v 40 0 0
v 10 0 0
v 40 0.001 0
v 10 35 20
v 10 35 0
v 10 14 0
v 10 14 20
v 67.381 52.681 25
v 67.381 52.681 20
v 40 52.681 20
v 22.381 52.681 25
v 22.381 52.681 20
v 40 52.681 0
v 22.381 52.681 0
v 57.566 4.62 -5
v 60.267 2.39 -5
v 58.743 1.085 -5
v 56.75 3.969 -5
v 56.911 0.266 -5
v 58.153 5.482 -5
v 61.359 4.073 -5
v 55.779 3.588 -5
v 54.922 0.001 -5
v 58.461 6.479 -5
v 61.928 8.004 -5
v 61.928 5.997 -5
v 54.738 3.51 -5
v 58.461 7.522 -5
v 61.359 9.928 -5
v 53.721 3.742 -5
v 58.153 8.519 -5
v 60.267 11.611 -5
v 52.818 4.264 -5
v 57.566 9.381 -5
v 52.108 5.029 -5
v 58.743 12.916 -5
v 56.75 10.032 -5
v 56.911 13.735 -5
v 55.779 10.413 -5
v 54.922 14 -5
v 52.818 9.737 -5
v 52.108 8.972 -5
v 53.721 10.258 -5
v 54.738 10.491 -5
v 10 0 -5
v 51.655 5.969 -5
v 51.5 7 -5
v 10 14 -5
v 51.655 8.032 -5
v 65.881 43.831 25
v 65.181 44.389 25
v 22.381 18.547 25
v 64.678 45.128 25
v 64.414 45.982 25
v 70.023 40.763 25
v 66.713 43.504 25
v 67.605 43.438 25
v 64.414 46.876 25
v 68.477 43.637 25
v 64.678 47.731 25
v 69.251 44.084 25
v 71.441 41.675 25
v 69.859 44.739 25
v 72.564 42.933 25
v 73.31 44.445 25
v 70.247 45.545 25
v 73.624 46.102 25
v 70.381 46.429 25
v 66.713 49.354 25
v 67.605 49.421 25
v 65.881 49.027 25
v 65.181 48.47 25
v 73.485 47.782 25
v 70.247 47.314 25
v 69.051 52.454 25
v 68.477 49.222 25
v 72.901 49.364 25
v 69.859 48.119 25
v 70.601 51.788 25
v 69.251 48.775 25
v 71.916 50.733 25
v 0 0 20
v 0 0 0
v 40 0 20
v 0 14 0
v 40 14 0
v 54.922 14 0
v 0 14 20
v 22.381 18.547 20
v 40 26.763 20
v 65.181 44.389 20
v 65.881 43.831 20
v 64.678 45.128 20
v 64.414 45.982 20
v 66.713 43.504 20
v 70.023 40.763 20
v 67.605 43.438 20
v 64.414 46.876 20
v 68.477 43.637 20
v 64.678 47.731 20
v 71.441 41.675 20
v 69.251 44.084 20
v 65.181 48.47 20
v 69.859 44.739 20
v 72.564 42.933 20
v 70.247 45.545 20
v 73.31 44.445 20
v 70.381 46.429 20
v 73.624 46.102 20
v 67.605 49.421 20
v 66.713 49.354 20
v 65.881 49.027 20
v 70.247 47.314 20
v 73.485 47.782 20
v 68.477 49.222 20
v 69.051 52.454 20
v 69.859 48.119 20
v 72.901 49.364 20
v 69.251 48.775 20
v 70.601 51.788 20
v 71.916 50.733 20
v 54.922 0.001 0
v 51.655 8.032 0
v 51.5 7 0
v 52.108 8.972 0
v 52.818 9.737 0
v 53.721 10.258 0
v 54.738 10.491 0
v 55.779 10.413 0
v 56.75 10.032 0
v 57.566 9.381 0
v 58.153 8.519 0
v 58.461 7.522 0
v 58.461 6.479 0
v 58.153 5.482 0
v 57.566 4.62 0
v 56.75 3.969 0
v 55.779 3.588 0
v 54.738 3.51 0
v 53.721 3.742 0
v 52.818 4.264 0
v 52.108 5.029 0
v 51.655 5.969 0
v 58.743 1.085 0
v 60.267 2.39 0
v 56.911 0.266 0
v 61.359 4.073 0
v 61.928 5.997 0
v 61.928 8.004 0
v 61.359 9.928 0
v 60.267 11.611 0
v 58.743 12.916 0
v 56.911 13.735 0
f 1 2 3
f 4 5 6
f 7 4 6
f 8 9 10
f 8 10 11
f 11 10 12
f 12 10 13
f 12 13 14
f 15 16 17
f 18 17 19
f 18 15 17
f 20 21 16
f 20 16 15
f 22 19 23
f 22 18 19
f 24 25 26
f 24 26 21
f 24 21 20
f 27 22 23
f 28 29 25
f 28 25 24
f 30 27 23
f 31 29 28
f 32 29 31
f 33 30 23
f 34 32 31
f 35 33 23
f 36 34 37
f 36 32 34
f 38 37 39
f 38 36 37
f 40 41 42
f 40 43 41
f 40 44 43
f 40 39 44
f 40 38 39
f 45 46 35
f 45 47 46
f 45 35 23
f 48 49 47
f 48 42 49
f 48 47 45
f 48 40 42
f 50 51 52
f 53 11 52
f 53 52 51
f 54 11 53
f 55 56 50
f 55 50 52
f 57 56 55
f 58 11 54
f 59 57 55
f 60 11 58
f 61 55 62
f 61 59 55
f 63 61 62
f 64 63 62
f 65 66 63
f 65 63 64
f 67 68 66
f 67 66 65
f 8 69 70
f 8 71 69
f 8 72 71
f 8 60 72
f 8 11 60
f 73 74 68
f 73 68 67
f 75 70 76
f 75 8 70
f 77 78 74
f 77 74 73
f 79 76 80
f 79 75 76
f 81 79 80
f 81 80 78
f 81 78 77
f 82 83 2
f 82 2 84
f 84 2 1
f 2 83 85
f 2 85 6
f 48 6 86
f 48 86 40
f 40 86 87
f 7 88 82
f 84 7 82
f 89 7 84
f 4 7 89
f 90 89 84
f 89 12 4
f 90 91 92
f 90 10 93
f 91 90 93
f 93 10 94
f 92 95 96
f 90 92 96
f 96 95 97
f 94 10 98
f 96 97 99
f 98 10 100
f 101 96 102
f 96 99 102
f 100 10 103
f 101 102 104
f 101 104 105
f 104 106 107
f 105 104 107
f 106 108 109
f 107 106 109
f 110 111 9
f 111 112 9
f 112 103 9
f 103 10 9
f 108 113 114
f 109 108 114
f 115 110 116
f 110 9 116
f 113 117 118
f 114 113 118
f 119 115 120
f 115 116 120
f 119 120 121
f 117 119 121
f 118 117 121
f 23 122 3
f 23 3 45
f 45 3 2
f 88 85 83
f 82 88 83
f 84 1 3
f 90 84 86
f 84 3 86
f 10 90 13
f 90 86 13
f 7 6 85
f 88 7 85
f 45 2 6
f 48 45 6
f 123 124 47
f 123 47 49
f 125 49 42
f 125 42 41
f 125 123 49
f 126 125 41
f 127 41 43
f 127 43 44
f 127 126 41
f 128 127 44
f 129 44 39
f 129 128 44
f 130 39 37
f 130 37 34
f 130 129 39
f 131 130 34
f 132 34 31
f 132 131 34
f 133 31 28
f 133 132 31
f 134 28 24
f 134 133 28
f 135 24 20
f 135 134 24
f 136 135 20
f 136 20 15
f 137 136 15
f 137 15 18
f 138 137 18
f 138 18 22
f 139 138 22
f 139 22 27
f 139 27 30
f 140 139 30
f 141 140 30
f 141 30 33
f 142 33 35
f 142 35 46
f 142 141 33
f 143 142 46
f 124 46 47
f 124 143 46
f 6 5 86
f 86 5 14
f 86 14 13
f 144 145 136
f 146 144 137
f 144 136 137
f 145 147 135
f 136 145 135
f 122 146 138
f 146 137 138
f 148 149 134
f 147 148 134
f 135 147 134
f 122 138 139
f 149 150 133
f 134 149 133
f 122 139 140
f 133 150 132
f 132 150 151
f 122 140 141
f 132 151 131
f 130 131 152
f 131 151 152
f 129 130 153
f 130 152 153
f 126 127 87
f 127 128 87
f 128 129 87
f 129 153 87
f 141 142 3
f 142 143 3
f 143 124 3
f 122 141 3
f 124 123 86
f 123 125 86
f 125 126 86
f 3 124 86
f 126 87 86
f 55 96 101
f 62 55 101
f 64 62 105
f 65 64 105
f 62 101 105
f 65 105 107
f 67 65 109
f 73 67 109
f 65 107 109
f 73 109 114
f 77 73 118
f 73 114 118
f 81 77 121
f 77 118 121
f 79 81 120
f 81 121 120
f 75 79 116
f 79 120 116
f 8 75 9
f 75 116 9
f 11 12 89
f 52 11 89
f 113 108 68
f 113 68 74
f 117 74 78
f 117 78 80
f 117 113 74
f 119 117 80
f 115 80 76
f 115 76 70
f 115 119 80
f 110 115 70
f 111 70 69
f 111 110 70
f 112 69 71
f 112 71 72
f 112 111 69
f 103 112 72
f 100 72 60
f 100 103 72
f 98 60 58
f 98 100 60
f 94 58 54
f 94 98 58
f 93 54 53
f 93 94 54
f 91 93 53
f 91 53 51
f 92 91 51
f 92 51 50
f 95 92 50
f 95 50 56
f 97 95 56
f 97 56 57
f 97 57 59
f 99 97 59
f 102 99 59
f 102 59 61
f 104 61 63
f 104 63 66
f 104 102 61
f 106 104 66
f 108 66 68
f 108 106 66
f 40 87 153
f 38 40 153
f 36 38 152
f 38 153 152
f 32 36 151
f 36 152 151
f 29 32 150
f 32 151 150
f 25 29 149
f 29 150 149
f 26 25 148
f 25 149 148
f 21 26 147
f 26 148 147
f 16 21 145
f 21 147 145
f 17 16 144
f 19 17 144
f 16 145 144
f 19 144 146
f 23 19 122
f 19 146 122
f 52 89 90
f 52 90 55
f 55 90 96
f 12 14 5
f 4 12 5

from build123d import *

# Parameters (mm, degrees)
DODANIE_WYCI_GNI_CIE1_DEPTH = 20
SZKIC2_R                    = 3.5
DODANIE_WYCI_GNI_CIE2_DEPTH = 5
SZKIC3_R                    = 3
DODANIE_WYCI_GNI_CIE3_DEPTH = 5


with BuildPart() as part:
    # Szkic1 → Dodanie-wyciągnięcie1 (new body)
    with BuildSketch(Plane.XY):
        Polygon((0, 0), (40, 0), (40, 52.681400645), (22.380650018, 52.681400645), (10, 35), (10, 14), (0, 14), align=None)
    extrude(amount=DODANIE_WYCI_GNI_CIE1_DEPTH)

    # Szkic2 → Dodanie-wyciągnięcie2 (add)
    with BuildSketch(Plane(origin=(0, 0, 0), x_dir=(-1, 0, 0), z_dir=(0, 0, -1))):
        with BuildLine():
            Line((-10, 0), (-10, 14))
            Line((-10, 14), (-54.922294035, 14))
            ThreePointArc((-54.922294035, 14), (-62, 7.00043131), (-54.922294026, 0.000862629))
            Line((-54.922294026, 0.000862629), (-10, 0))
        make_face()
        with Locations((-55, 7.000431315)):
            Circle(SZKIC2_R, mode=Mode.SUBTRACT)
    extrude(amount=DODANIE_WYCI_GNI_CIE2_DEPTH)

    # Szkic3 → Dodanie-wyciągnięcie3 (add)
    with BuildSketch(Plane.XY.offset(20)):
        with BuildLine():
            Line((22.380650018, 52.681400645), (22.380650018, 18.546912235))
            Line((22.380650018, 18.546912235), (70.022924699, 40.762869771))
            ThreePointArc((70.022924699, 40.762869771), (73.484603525, 47.782460025), (67.380650018, 52.681400645))
            Line((67.380650018, 52.681400645), (22.380650018, 52.681400645))
        make_face()
        with Locations((67.380650018, 46.429246111)):
            Circle(SZKIC3_R, mode=Mode.SUBTRACT)
    extrude(amount=DODANIE_WYCI_GNI_CIE3_DEPTH)


solid = part.part
